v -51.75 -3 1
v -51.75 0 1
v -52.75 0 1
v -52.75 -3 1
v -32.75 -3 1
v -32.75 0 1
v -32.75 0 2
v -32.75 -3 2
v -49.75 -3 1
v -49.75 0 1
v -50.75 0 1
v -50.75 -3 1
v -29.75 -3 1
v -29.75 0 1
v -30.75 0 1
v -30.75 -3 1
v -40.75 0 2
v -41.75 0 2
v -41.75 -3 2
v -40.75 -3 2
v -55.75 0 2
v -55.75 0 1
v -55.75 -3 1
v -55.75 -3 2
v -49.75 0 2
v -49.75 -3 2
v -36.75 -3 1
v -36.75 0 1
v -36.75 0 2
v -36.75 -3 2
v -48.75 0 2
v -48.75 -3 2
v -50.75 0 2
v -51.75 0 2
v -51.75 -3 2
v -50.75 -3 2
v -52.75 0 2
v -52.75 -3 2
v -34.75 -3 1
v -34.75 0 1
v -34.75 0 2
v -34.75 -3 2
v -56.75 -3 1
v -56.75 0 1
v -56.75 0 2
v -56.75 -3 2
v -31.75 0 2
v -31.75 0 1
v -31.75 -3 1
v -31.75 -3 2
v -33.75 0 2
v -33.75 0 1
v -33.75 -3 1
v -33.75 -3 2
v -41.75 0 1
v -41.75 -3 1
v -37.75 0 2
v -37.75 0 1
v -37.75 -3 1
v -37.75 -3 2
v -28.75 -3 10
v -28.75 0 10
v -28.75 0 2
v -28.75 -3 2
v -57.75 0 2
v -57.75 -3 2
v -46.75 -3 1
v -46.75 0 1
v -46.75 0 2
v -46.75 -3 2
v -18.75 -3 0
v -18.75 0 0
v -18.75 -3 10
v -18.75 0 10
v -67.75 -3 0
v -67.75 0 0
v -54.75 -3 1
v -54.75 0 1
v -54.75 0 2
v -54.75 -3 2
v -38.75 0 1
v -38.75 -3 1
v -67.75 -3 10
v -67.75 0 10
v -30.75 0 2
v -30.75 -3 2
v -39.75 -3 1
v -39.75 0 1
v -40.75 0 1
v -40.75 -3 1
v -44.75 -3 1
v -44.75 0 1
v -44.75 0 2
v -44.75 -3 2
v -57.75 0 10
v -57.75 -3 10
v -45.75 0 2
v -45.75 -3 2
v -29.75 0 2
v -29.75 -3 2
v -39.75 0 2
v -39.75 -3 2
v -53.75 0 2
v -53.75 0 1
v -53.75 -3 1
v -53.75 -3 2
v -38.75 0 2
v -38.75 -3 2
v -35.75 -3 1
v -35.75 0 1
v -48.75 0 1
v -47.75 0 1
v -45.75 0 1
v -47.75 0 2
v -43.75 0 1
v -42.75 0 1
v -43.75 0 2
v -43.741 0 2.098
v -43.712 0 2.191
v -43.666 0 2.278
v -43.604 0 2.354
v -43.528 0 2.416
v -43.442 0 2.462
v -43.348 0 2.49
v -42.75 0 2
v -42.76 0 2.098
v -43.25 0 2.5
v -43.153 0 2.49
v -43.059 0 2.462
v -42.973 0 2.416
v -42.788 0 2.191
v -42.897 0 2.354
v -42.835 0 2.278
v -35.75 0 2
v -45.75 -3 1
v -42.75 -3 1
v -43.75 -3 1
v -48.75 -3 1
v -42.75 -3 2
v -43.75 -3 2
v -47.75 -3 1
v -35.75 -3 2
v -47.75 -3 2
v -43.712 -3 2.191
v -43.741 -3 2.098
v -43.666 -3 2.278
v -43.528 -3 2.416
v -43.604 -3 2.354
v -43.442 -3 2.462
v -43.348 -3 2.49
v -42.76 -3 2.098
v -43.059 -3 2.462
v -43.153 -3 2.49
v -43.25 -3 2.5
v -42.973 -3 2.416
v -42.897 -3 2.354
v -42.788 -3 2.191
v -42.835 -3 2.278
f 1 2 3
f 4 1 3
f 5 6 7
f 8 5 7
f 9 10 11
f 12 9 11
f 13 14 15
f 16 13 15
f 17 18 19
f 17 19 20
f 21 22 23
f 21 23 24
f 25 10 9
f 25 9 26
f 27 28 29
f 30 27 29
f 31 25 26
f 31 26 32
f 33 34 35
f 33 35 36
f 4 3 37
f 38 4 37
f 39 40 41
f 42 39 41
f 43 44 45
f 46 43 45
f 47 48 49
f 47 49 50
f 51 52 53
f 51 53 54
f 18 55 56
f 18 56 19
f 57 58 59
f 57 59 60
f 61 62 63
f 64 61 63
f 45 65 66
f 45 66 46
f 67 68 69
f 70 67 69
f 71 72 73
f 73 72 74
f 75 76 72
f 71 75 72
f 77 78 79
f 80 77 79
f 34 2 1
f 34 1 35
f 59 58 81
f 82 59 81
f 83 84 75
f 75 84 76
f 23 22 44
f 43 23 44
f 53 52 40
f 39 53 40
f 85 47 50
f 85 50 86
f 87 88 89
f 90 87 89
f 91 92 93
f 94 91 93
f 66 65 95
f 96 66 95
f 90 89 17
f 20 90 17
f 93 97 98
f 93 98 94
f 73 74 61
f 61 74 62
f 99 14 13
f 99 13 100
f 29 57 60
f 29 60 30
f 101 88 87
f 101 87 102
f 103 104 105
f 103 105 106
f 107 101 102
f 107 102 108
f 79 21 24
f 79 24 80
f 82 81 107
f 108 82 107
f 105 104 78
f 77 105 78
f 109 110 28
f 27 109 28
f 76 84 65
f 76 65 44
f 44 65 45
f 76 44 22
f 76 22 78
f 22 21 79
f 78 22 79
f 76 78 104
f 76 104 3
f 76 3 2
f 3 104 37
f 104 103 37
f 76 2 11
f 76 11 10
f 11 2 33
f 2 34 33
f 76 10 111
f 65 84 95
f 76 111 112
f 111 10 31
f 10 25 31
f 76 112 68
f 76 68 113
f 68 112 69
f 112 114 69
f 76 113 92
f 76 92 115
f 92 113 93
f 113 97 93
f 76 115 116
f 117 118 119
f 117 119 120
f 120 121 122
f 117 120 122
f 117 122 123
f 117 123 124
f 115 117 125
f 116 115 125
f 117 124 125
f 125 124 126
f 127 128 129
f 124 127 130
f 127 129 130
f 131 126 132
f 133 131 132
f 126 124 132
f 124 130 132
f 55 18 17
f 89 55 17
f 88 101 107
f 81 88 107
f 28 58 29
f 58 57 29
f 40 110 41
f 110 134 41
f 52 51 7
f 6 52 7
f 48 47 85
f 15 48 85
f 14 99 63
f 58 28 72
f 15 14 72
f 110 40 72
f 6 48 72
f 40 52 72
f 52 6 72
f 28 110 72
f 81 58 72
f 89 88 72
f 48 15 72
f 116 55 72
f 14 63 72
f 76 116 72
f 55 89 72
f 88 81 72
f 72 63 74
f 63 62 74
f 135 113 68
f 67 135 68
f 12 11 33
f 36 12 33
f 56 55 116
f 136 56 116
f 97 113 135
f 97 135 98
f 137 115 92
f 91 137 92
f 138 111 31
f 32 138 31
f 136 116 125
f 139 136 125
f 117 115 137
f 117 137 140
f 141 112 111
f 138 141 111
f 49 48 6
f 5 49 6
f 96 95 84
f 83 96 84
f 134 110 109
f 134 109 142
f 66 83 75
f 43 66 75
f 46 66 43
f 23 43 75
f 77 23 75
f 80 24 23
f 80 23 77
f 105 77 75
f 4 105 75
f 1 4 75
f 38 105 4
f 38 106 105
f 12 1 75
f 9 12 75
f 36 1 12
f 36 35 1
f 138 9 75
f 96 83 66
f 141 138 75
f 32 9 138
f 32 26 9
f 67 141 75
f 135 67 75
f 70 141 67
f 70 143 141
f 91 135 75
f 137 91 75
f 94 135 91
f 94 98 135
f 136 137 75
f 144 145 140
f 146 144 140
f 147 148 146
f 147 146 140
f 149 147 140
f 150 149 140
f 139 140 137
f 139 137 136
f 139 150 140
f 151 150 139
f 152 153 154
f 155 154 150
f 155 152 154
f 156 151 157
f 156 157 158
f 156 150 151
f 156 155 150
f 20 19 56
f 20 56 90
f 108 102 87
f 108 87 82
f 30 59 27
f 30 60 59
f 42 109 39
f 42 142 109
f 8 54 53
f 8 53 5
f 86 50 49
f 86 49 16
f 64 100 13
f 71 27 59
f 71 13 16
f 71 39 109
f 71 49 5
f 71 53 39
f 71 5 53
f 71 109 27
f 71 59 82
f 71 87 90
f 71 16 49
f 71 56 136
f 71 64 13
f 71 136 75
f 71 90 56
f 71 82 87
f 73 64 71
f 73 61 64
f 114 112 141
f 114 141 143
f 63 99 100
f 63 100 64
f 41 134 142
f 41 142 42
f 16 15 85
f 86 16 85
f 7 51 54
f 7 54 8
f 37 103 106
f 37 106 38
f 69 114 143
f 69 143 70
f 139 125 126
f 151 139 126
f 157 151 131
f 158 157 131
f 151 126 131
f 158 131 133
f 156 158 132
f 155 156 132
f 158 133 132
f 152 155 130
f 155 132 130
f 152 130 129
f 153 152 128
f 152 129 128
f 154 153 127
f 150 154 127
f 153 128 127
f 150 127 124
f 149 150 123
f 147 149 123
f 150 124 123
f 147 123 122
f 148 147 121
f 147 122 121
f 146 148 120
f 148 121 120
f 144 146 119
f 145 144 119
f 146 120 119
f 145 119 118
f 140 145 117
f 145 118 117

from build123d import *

# Parameters (mm, degrees)
F0_W     = 1
F0_H     = 1
F1_DEPTH = 3


with BuildPart() as f1:
    # F0 (on Front) → F1 (new body)
    with BuildSketch(Plane.XZ):
        Polygon((-57.750295, 1), (-57.750295, 0), (-28.750295, 0), (-28.750295, 1), (-29.750295, 1), (-30.750295, 1), (-31.750295, 1), (-32.750295, 1), (-33.750295, 1), (-34.750295, 1), (-35.750295, 1), (-36.750295, 1), (-37.750295, 1), (-38.750295, 1), (-39.750295, 1), (-40.750295, 1), (-41.750295, 1), (-42.750295, 1), (-43.750295, 1), (-44.750295, 1), (-45.750295, 1), (-46.750295, 1), (-47.750295, 1), (-48.750295, 1), (-49.750295, 1), (-50.750295, 1), (-51.750295, 1), (-52.750295, 1), (-53.750295, 1), (-54.750295, 1), (-55.750295, 1), (-56.750295, 1), align=None)
        Polygon((-67.750295, 0), (-57.750295, 0), (-57.750295, 1), (-57.750295, 2), (-57.750295, 10), (-67.750295, 10), align=None)
        Polygon((-28.750295, 1), (-28.750295, 0), (-18.750295, 0), (-18.750295, 10), (-28.750295, 10), (-28.750295, 2), align=None)
        with Locations((-57.250295, 1.5)):
            Rectangle(F0_W, F0_H)
        with Locations((-29.250295, 1.5)):
            Rectangle(F0_W, F0_H)
        with Locations((-55.250295, 1.5)):
            Rectangle(F0_W, F0_H)
        with Locations((-31.250295, 1.5)):
            Rectangle(F0_W, F0_H)
        with Locations((-53.250295, 1.5)):
            Rectangle(F0_W, F0_H)
        with Locations((-33.250295, 1.5)):
            Rectangle(F0_W, F0_H)
        with Locations((-51.250295, 1.5)):
            Rectangle(F0_W, F0_H)
        with Locations((-35.250295, 1.5)):
            Rectangle(F0_W, F0_H)
        with Locations((-49.250295, 1.5)):
            Rectangle(F0_W, F0_H)
        with Locations((-37.250295, 1.5)):
            Rectangle(F0_W, F0_H)
        with Locations((-47.250295, 1.5)):
            Rectangle(F0_W, F0_H)
        with Locations((-39.250295, 1.5)):
            Rectangle(F0_W, F0_H)
        with Locations((-45.250295, 1.5)):
            Rectangle(F0_W, F0_H)
        with Locations((-41.250295, 1.5)):
            Rectangle(F0_W, F0_H)
        with Locations((-43.250295, 1.5)):
            Rectangle(F0_W, F0_H)
        with BuildLine():
            ThreePointArc((-42.750295, 2), (-43.250295, 2.5), (-43.750295, 2))
            Line((-43.750295, 2), (-42.750295, 2))
        make_face()
    extrude(amount=F1_DEPTH)


solid = f1.part
